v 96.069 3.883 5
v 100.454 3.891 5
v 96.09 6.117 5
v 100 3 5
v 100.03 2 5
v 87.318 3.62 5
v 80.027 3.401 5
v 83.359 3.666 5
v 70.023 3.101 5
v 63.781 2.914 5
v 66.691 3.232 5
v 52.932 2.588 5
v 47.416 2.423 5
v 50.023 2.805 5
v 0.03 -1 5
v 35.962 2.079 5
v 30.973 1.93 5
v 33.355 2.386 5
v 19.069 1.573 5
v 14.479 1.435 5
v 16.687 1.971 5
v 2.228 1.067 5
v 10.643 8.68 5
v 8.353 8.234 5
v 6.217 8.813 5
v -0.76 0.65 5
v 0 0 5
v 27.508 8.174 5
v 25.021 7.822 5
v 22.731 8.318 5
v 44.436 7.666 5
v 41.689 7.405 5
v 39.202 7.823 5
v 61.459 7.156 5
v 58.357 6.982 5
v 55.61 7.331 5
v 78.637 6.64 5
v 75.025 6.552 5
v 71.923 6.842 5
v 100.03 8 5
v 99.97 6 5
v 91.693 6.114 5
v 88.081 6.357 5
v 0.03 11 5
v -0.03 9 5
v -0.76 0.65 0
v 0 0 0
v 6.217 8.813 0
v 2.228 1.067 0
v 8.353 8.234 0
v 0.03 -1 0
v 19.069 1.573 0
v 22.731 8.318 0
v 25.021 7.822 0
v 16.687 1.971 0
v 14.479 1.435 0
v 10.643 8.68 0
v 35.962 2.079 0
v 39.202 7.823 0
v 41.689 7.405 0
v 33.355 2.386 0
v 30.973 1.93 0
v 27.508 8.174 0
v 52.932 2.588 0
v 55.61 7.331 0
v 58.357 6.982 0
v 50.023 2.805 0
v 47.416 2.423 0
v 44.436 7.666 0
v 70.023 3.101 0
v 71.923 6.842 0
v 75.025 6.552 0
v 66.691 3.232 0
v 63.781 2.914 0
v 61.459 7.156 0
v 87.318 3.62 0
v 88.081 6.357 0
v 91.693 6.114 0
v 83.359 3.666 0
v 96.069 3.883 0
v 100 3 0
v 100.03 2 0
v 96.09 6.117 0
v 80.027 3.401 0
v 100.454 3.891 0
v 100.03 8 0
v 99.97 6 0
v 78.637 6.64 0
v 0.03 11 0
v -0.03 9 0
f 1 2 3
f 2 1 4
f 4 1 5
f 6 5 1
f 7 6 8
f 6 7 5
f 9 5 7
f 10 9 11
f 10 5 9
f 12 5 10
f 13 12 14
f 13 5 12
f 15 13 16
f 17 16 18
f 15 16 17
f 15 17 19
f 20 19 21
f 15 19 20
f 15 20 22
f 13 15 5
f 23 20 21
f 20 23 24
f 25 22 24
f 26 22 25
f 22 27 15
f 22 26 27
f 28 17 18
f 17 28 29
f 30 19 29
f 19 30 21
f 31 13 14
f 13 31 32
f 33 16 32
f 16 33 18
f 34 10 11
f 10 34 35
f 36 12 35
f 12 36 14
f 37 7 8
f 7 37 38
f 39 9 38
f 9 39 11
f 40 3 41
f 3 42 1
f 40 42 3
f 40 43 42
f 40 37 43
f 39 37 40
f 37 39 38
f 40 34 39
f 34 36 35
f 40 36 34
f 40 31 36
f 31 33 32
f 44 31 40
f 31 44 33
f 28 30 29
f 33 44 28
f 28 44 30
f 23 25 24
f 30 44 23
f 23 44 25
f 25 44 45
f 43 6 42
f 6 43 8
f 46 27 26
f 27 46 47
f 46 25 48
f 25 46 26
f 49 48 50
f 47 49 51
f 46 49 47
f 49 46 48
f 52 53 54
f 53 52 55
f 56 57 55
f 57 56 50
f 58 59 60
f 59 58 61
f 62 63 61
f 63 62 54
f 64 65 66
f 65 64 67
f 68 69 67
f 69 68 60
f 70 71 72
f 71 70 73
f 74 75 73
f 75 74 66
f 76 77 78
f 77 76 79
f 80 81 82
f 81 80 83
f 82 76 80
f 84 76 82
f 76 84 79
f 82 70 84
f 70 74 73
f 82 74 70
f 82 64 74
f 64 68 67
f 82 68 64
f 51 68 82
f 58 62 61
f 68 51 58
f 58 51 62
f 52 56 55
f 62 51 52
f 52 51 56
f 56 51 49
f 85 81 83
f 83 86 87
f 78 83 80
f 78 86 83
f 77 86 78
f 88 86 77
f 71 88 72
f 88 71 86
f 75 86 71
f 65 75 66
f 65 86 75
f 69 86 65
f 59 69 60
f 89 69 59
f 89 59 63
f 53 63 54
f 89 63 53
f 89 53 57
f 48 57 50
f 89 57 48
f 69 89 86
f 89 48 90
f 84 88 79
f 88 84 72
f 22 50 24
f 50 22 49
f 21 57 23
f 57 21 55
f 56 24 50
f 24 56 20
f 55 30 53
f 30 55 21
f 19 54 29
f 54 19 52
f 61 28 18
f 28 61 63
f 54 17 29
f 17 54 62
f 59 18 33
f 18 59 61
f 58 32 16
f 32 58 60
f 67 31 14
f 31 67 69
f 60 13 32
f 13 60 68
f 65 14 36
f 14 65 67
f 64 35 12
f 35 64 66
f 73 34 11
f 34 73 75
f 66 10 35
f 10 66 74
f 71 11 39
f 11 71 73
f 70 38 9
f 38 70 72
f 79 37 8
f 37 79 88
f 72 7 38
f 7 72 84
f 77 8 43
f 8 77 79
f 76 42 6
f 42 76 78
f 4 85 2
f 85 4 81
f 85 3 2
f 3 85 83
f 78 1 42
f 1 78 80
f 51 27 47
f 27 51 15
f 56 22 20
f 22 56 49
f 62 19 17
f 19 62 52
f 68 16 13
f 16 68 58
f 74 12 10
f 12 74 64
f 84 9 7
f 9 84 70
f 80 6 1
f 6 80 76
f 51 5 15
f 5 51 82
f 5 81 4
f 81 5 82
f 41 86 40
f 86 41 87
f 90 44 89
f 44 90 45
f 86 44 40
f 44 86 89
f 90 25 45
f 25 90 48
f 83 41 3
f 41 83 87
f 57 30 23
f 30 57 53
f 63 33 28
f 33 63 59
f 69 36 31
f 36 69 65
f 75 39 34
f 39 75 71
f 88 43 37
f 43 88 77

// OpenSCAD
function distance(a, b) = sqrt( (a[0] - b[0])*(a[0] - b[0]) +
                                (a[1] - b[1])*(a[1] - b[1]) +
                                (a[2] - b[2])*(a[2] - b[2]) );

function length2(a) = sqrt( a[0]*a[0] + a[1]*a[1] );

function normalized(a) = a / (max(distance([0,0,0], a), 0.00001));

function normalized_axis(a) = a == "x" ? [1, 0, 0]:
                   a == "y" ? [0, 1, 0]:
                   a == "z" ? [0, 0, 1]: normalized(a);

function angleOfNormalizedVector(n) = [0, -atan2(n[2], length2([n[0], n[1]])), atan2(n[1], n[0]) ];

function angle(v) = angleOfNormalizedVector(normalized(v));

function angleBetweenTwoPoints(a, b) = angle(normalized(b-a));

module line(start, end, height, thik){
	l=distance(start,end);
	r=angleBetweenTwoPoints(start,end);
	translate(start)
		rotate(r){
			translate([0,thik/-2,0])
				cube([l,thik,height]);
			//cylinder(d=thik,h=height,$fn=10);
			//translate([l,0,0])
			//	cylinder(d=thik,h=height,$fn=10);
		}
}
module zig_zag(i, step, start1, start2, vec1, vec2,height, thik){
	p1=i*vec1+start1;
	p2=(i+step/2)*vec2+start2;
	p3=(i+step)*vec1+start1;
	line(p1,p2,height,thik);
	line(p2,p3,height,thik);
}

start1=[0,0,0];
end1=[100,3,0];
start2=[0,10,0];
end2=[100,7,0];
h=5;
t=2;
step_count=6;

line(start1,end1,h,t);
line(start2,end2,h,t);
step=1/step_count;
for(i=[0:step:1-step]){
	zig_zag(i,step,start1, start2, end1-start1, end2-start2,h,t);
}
